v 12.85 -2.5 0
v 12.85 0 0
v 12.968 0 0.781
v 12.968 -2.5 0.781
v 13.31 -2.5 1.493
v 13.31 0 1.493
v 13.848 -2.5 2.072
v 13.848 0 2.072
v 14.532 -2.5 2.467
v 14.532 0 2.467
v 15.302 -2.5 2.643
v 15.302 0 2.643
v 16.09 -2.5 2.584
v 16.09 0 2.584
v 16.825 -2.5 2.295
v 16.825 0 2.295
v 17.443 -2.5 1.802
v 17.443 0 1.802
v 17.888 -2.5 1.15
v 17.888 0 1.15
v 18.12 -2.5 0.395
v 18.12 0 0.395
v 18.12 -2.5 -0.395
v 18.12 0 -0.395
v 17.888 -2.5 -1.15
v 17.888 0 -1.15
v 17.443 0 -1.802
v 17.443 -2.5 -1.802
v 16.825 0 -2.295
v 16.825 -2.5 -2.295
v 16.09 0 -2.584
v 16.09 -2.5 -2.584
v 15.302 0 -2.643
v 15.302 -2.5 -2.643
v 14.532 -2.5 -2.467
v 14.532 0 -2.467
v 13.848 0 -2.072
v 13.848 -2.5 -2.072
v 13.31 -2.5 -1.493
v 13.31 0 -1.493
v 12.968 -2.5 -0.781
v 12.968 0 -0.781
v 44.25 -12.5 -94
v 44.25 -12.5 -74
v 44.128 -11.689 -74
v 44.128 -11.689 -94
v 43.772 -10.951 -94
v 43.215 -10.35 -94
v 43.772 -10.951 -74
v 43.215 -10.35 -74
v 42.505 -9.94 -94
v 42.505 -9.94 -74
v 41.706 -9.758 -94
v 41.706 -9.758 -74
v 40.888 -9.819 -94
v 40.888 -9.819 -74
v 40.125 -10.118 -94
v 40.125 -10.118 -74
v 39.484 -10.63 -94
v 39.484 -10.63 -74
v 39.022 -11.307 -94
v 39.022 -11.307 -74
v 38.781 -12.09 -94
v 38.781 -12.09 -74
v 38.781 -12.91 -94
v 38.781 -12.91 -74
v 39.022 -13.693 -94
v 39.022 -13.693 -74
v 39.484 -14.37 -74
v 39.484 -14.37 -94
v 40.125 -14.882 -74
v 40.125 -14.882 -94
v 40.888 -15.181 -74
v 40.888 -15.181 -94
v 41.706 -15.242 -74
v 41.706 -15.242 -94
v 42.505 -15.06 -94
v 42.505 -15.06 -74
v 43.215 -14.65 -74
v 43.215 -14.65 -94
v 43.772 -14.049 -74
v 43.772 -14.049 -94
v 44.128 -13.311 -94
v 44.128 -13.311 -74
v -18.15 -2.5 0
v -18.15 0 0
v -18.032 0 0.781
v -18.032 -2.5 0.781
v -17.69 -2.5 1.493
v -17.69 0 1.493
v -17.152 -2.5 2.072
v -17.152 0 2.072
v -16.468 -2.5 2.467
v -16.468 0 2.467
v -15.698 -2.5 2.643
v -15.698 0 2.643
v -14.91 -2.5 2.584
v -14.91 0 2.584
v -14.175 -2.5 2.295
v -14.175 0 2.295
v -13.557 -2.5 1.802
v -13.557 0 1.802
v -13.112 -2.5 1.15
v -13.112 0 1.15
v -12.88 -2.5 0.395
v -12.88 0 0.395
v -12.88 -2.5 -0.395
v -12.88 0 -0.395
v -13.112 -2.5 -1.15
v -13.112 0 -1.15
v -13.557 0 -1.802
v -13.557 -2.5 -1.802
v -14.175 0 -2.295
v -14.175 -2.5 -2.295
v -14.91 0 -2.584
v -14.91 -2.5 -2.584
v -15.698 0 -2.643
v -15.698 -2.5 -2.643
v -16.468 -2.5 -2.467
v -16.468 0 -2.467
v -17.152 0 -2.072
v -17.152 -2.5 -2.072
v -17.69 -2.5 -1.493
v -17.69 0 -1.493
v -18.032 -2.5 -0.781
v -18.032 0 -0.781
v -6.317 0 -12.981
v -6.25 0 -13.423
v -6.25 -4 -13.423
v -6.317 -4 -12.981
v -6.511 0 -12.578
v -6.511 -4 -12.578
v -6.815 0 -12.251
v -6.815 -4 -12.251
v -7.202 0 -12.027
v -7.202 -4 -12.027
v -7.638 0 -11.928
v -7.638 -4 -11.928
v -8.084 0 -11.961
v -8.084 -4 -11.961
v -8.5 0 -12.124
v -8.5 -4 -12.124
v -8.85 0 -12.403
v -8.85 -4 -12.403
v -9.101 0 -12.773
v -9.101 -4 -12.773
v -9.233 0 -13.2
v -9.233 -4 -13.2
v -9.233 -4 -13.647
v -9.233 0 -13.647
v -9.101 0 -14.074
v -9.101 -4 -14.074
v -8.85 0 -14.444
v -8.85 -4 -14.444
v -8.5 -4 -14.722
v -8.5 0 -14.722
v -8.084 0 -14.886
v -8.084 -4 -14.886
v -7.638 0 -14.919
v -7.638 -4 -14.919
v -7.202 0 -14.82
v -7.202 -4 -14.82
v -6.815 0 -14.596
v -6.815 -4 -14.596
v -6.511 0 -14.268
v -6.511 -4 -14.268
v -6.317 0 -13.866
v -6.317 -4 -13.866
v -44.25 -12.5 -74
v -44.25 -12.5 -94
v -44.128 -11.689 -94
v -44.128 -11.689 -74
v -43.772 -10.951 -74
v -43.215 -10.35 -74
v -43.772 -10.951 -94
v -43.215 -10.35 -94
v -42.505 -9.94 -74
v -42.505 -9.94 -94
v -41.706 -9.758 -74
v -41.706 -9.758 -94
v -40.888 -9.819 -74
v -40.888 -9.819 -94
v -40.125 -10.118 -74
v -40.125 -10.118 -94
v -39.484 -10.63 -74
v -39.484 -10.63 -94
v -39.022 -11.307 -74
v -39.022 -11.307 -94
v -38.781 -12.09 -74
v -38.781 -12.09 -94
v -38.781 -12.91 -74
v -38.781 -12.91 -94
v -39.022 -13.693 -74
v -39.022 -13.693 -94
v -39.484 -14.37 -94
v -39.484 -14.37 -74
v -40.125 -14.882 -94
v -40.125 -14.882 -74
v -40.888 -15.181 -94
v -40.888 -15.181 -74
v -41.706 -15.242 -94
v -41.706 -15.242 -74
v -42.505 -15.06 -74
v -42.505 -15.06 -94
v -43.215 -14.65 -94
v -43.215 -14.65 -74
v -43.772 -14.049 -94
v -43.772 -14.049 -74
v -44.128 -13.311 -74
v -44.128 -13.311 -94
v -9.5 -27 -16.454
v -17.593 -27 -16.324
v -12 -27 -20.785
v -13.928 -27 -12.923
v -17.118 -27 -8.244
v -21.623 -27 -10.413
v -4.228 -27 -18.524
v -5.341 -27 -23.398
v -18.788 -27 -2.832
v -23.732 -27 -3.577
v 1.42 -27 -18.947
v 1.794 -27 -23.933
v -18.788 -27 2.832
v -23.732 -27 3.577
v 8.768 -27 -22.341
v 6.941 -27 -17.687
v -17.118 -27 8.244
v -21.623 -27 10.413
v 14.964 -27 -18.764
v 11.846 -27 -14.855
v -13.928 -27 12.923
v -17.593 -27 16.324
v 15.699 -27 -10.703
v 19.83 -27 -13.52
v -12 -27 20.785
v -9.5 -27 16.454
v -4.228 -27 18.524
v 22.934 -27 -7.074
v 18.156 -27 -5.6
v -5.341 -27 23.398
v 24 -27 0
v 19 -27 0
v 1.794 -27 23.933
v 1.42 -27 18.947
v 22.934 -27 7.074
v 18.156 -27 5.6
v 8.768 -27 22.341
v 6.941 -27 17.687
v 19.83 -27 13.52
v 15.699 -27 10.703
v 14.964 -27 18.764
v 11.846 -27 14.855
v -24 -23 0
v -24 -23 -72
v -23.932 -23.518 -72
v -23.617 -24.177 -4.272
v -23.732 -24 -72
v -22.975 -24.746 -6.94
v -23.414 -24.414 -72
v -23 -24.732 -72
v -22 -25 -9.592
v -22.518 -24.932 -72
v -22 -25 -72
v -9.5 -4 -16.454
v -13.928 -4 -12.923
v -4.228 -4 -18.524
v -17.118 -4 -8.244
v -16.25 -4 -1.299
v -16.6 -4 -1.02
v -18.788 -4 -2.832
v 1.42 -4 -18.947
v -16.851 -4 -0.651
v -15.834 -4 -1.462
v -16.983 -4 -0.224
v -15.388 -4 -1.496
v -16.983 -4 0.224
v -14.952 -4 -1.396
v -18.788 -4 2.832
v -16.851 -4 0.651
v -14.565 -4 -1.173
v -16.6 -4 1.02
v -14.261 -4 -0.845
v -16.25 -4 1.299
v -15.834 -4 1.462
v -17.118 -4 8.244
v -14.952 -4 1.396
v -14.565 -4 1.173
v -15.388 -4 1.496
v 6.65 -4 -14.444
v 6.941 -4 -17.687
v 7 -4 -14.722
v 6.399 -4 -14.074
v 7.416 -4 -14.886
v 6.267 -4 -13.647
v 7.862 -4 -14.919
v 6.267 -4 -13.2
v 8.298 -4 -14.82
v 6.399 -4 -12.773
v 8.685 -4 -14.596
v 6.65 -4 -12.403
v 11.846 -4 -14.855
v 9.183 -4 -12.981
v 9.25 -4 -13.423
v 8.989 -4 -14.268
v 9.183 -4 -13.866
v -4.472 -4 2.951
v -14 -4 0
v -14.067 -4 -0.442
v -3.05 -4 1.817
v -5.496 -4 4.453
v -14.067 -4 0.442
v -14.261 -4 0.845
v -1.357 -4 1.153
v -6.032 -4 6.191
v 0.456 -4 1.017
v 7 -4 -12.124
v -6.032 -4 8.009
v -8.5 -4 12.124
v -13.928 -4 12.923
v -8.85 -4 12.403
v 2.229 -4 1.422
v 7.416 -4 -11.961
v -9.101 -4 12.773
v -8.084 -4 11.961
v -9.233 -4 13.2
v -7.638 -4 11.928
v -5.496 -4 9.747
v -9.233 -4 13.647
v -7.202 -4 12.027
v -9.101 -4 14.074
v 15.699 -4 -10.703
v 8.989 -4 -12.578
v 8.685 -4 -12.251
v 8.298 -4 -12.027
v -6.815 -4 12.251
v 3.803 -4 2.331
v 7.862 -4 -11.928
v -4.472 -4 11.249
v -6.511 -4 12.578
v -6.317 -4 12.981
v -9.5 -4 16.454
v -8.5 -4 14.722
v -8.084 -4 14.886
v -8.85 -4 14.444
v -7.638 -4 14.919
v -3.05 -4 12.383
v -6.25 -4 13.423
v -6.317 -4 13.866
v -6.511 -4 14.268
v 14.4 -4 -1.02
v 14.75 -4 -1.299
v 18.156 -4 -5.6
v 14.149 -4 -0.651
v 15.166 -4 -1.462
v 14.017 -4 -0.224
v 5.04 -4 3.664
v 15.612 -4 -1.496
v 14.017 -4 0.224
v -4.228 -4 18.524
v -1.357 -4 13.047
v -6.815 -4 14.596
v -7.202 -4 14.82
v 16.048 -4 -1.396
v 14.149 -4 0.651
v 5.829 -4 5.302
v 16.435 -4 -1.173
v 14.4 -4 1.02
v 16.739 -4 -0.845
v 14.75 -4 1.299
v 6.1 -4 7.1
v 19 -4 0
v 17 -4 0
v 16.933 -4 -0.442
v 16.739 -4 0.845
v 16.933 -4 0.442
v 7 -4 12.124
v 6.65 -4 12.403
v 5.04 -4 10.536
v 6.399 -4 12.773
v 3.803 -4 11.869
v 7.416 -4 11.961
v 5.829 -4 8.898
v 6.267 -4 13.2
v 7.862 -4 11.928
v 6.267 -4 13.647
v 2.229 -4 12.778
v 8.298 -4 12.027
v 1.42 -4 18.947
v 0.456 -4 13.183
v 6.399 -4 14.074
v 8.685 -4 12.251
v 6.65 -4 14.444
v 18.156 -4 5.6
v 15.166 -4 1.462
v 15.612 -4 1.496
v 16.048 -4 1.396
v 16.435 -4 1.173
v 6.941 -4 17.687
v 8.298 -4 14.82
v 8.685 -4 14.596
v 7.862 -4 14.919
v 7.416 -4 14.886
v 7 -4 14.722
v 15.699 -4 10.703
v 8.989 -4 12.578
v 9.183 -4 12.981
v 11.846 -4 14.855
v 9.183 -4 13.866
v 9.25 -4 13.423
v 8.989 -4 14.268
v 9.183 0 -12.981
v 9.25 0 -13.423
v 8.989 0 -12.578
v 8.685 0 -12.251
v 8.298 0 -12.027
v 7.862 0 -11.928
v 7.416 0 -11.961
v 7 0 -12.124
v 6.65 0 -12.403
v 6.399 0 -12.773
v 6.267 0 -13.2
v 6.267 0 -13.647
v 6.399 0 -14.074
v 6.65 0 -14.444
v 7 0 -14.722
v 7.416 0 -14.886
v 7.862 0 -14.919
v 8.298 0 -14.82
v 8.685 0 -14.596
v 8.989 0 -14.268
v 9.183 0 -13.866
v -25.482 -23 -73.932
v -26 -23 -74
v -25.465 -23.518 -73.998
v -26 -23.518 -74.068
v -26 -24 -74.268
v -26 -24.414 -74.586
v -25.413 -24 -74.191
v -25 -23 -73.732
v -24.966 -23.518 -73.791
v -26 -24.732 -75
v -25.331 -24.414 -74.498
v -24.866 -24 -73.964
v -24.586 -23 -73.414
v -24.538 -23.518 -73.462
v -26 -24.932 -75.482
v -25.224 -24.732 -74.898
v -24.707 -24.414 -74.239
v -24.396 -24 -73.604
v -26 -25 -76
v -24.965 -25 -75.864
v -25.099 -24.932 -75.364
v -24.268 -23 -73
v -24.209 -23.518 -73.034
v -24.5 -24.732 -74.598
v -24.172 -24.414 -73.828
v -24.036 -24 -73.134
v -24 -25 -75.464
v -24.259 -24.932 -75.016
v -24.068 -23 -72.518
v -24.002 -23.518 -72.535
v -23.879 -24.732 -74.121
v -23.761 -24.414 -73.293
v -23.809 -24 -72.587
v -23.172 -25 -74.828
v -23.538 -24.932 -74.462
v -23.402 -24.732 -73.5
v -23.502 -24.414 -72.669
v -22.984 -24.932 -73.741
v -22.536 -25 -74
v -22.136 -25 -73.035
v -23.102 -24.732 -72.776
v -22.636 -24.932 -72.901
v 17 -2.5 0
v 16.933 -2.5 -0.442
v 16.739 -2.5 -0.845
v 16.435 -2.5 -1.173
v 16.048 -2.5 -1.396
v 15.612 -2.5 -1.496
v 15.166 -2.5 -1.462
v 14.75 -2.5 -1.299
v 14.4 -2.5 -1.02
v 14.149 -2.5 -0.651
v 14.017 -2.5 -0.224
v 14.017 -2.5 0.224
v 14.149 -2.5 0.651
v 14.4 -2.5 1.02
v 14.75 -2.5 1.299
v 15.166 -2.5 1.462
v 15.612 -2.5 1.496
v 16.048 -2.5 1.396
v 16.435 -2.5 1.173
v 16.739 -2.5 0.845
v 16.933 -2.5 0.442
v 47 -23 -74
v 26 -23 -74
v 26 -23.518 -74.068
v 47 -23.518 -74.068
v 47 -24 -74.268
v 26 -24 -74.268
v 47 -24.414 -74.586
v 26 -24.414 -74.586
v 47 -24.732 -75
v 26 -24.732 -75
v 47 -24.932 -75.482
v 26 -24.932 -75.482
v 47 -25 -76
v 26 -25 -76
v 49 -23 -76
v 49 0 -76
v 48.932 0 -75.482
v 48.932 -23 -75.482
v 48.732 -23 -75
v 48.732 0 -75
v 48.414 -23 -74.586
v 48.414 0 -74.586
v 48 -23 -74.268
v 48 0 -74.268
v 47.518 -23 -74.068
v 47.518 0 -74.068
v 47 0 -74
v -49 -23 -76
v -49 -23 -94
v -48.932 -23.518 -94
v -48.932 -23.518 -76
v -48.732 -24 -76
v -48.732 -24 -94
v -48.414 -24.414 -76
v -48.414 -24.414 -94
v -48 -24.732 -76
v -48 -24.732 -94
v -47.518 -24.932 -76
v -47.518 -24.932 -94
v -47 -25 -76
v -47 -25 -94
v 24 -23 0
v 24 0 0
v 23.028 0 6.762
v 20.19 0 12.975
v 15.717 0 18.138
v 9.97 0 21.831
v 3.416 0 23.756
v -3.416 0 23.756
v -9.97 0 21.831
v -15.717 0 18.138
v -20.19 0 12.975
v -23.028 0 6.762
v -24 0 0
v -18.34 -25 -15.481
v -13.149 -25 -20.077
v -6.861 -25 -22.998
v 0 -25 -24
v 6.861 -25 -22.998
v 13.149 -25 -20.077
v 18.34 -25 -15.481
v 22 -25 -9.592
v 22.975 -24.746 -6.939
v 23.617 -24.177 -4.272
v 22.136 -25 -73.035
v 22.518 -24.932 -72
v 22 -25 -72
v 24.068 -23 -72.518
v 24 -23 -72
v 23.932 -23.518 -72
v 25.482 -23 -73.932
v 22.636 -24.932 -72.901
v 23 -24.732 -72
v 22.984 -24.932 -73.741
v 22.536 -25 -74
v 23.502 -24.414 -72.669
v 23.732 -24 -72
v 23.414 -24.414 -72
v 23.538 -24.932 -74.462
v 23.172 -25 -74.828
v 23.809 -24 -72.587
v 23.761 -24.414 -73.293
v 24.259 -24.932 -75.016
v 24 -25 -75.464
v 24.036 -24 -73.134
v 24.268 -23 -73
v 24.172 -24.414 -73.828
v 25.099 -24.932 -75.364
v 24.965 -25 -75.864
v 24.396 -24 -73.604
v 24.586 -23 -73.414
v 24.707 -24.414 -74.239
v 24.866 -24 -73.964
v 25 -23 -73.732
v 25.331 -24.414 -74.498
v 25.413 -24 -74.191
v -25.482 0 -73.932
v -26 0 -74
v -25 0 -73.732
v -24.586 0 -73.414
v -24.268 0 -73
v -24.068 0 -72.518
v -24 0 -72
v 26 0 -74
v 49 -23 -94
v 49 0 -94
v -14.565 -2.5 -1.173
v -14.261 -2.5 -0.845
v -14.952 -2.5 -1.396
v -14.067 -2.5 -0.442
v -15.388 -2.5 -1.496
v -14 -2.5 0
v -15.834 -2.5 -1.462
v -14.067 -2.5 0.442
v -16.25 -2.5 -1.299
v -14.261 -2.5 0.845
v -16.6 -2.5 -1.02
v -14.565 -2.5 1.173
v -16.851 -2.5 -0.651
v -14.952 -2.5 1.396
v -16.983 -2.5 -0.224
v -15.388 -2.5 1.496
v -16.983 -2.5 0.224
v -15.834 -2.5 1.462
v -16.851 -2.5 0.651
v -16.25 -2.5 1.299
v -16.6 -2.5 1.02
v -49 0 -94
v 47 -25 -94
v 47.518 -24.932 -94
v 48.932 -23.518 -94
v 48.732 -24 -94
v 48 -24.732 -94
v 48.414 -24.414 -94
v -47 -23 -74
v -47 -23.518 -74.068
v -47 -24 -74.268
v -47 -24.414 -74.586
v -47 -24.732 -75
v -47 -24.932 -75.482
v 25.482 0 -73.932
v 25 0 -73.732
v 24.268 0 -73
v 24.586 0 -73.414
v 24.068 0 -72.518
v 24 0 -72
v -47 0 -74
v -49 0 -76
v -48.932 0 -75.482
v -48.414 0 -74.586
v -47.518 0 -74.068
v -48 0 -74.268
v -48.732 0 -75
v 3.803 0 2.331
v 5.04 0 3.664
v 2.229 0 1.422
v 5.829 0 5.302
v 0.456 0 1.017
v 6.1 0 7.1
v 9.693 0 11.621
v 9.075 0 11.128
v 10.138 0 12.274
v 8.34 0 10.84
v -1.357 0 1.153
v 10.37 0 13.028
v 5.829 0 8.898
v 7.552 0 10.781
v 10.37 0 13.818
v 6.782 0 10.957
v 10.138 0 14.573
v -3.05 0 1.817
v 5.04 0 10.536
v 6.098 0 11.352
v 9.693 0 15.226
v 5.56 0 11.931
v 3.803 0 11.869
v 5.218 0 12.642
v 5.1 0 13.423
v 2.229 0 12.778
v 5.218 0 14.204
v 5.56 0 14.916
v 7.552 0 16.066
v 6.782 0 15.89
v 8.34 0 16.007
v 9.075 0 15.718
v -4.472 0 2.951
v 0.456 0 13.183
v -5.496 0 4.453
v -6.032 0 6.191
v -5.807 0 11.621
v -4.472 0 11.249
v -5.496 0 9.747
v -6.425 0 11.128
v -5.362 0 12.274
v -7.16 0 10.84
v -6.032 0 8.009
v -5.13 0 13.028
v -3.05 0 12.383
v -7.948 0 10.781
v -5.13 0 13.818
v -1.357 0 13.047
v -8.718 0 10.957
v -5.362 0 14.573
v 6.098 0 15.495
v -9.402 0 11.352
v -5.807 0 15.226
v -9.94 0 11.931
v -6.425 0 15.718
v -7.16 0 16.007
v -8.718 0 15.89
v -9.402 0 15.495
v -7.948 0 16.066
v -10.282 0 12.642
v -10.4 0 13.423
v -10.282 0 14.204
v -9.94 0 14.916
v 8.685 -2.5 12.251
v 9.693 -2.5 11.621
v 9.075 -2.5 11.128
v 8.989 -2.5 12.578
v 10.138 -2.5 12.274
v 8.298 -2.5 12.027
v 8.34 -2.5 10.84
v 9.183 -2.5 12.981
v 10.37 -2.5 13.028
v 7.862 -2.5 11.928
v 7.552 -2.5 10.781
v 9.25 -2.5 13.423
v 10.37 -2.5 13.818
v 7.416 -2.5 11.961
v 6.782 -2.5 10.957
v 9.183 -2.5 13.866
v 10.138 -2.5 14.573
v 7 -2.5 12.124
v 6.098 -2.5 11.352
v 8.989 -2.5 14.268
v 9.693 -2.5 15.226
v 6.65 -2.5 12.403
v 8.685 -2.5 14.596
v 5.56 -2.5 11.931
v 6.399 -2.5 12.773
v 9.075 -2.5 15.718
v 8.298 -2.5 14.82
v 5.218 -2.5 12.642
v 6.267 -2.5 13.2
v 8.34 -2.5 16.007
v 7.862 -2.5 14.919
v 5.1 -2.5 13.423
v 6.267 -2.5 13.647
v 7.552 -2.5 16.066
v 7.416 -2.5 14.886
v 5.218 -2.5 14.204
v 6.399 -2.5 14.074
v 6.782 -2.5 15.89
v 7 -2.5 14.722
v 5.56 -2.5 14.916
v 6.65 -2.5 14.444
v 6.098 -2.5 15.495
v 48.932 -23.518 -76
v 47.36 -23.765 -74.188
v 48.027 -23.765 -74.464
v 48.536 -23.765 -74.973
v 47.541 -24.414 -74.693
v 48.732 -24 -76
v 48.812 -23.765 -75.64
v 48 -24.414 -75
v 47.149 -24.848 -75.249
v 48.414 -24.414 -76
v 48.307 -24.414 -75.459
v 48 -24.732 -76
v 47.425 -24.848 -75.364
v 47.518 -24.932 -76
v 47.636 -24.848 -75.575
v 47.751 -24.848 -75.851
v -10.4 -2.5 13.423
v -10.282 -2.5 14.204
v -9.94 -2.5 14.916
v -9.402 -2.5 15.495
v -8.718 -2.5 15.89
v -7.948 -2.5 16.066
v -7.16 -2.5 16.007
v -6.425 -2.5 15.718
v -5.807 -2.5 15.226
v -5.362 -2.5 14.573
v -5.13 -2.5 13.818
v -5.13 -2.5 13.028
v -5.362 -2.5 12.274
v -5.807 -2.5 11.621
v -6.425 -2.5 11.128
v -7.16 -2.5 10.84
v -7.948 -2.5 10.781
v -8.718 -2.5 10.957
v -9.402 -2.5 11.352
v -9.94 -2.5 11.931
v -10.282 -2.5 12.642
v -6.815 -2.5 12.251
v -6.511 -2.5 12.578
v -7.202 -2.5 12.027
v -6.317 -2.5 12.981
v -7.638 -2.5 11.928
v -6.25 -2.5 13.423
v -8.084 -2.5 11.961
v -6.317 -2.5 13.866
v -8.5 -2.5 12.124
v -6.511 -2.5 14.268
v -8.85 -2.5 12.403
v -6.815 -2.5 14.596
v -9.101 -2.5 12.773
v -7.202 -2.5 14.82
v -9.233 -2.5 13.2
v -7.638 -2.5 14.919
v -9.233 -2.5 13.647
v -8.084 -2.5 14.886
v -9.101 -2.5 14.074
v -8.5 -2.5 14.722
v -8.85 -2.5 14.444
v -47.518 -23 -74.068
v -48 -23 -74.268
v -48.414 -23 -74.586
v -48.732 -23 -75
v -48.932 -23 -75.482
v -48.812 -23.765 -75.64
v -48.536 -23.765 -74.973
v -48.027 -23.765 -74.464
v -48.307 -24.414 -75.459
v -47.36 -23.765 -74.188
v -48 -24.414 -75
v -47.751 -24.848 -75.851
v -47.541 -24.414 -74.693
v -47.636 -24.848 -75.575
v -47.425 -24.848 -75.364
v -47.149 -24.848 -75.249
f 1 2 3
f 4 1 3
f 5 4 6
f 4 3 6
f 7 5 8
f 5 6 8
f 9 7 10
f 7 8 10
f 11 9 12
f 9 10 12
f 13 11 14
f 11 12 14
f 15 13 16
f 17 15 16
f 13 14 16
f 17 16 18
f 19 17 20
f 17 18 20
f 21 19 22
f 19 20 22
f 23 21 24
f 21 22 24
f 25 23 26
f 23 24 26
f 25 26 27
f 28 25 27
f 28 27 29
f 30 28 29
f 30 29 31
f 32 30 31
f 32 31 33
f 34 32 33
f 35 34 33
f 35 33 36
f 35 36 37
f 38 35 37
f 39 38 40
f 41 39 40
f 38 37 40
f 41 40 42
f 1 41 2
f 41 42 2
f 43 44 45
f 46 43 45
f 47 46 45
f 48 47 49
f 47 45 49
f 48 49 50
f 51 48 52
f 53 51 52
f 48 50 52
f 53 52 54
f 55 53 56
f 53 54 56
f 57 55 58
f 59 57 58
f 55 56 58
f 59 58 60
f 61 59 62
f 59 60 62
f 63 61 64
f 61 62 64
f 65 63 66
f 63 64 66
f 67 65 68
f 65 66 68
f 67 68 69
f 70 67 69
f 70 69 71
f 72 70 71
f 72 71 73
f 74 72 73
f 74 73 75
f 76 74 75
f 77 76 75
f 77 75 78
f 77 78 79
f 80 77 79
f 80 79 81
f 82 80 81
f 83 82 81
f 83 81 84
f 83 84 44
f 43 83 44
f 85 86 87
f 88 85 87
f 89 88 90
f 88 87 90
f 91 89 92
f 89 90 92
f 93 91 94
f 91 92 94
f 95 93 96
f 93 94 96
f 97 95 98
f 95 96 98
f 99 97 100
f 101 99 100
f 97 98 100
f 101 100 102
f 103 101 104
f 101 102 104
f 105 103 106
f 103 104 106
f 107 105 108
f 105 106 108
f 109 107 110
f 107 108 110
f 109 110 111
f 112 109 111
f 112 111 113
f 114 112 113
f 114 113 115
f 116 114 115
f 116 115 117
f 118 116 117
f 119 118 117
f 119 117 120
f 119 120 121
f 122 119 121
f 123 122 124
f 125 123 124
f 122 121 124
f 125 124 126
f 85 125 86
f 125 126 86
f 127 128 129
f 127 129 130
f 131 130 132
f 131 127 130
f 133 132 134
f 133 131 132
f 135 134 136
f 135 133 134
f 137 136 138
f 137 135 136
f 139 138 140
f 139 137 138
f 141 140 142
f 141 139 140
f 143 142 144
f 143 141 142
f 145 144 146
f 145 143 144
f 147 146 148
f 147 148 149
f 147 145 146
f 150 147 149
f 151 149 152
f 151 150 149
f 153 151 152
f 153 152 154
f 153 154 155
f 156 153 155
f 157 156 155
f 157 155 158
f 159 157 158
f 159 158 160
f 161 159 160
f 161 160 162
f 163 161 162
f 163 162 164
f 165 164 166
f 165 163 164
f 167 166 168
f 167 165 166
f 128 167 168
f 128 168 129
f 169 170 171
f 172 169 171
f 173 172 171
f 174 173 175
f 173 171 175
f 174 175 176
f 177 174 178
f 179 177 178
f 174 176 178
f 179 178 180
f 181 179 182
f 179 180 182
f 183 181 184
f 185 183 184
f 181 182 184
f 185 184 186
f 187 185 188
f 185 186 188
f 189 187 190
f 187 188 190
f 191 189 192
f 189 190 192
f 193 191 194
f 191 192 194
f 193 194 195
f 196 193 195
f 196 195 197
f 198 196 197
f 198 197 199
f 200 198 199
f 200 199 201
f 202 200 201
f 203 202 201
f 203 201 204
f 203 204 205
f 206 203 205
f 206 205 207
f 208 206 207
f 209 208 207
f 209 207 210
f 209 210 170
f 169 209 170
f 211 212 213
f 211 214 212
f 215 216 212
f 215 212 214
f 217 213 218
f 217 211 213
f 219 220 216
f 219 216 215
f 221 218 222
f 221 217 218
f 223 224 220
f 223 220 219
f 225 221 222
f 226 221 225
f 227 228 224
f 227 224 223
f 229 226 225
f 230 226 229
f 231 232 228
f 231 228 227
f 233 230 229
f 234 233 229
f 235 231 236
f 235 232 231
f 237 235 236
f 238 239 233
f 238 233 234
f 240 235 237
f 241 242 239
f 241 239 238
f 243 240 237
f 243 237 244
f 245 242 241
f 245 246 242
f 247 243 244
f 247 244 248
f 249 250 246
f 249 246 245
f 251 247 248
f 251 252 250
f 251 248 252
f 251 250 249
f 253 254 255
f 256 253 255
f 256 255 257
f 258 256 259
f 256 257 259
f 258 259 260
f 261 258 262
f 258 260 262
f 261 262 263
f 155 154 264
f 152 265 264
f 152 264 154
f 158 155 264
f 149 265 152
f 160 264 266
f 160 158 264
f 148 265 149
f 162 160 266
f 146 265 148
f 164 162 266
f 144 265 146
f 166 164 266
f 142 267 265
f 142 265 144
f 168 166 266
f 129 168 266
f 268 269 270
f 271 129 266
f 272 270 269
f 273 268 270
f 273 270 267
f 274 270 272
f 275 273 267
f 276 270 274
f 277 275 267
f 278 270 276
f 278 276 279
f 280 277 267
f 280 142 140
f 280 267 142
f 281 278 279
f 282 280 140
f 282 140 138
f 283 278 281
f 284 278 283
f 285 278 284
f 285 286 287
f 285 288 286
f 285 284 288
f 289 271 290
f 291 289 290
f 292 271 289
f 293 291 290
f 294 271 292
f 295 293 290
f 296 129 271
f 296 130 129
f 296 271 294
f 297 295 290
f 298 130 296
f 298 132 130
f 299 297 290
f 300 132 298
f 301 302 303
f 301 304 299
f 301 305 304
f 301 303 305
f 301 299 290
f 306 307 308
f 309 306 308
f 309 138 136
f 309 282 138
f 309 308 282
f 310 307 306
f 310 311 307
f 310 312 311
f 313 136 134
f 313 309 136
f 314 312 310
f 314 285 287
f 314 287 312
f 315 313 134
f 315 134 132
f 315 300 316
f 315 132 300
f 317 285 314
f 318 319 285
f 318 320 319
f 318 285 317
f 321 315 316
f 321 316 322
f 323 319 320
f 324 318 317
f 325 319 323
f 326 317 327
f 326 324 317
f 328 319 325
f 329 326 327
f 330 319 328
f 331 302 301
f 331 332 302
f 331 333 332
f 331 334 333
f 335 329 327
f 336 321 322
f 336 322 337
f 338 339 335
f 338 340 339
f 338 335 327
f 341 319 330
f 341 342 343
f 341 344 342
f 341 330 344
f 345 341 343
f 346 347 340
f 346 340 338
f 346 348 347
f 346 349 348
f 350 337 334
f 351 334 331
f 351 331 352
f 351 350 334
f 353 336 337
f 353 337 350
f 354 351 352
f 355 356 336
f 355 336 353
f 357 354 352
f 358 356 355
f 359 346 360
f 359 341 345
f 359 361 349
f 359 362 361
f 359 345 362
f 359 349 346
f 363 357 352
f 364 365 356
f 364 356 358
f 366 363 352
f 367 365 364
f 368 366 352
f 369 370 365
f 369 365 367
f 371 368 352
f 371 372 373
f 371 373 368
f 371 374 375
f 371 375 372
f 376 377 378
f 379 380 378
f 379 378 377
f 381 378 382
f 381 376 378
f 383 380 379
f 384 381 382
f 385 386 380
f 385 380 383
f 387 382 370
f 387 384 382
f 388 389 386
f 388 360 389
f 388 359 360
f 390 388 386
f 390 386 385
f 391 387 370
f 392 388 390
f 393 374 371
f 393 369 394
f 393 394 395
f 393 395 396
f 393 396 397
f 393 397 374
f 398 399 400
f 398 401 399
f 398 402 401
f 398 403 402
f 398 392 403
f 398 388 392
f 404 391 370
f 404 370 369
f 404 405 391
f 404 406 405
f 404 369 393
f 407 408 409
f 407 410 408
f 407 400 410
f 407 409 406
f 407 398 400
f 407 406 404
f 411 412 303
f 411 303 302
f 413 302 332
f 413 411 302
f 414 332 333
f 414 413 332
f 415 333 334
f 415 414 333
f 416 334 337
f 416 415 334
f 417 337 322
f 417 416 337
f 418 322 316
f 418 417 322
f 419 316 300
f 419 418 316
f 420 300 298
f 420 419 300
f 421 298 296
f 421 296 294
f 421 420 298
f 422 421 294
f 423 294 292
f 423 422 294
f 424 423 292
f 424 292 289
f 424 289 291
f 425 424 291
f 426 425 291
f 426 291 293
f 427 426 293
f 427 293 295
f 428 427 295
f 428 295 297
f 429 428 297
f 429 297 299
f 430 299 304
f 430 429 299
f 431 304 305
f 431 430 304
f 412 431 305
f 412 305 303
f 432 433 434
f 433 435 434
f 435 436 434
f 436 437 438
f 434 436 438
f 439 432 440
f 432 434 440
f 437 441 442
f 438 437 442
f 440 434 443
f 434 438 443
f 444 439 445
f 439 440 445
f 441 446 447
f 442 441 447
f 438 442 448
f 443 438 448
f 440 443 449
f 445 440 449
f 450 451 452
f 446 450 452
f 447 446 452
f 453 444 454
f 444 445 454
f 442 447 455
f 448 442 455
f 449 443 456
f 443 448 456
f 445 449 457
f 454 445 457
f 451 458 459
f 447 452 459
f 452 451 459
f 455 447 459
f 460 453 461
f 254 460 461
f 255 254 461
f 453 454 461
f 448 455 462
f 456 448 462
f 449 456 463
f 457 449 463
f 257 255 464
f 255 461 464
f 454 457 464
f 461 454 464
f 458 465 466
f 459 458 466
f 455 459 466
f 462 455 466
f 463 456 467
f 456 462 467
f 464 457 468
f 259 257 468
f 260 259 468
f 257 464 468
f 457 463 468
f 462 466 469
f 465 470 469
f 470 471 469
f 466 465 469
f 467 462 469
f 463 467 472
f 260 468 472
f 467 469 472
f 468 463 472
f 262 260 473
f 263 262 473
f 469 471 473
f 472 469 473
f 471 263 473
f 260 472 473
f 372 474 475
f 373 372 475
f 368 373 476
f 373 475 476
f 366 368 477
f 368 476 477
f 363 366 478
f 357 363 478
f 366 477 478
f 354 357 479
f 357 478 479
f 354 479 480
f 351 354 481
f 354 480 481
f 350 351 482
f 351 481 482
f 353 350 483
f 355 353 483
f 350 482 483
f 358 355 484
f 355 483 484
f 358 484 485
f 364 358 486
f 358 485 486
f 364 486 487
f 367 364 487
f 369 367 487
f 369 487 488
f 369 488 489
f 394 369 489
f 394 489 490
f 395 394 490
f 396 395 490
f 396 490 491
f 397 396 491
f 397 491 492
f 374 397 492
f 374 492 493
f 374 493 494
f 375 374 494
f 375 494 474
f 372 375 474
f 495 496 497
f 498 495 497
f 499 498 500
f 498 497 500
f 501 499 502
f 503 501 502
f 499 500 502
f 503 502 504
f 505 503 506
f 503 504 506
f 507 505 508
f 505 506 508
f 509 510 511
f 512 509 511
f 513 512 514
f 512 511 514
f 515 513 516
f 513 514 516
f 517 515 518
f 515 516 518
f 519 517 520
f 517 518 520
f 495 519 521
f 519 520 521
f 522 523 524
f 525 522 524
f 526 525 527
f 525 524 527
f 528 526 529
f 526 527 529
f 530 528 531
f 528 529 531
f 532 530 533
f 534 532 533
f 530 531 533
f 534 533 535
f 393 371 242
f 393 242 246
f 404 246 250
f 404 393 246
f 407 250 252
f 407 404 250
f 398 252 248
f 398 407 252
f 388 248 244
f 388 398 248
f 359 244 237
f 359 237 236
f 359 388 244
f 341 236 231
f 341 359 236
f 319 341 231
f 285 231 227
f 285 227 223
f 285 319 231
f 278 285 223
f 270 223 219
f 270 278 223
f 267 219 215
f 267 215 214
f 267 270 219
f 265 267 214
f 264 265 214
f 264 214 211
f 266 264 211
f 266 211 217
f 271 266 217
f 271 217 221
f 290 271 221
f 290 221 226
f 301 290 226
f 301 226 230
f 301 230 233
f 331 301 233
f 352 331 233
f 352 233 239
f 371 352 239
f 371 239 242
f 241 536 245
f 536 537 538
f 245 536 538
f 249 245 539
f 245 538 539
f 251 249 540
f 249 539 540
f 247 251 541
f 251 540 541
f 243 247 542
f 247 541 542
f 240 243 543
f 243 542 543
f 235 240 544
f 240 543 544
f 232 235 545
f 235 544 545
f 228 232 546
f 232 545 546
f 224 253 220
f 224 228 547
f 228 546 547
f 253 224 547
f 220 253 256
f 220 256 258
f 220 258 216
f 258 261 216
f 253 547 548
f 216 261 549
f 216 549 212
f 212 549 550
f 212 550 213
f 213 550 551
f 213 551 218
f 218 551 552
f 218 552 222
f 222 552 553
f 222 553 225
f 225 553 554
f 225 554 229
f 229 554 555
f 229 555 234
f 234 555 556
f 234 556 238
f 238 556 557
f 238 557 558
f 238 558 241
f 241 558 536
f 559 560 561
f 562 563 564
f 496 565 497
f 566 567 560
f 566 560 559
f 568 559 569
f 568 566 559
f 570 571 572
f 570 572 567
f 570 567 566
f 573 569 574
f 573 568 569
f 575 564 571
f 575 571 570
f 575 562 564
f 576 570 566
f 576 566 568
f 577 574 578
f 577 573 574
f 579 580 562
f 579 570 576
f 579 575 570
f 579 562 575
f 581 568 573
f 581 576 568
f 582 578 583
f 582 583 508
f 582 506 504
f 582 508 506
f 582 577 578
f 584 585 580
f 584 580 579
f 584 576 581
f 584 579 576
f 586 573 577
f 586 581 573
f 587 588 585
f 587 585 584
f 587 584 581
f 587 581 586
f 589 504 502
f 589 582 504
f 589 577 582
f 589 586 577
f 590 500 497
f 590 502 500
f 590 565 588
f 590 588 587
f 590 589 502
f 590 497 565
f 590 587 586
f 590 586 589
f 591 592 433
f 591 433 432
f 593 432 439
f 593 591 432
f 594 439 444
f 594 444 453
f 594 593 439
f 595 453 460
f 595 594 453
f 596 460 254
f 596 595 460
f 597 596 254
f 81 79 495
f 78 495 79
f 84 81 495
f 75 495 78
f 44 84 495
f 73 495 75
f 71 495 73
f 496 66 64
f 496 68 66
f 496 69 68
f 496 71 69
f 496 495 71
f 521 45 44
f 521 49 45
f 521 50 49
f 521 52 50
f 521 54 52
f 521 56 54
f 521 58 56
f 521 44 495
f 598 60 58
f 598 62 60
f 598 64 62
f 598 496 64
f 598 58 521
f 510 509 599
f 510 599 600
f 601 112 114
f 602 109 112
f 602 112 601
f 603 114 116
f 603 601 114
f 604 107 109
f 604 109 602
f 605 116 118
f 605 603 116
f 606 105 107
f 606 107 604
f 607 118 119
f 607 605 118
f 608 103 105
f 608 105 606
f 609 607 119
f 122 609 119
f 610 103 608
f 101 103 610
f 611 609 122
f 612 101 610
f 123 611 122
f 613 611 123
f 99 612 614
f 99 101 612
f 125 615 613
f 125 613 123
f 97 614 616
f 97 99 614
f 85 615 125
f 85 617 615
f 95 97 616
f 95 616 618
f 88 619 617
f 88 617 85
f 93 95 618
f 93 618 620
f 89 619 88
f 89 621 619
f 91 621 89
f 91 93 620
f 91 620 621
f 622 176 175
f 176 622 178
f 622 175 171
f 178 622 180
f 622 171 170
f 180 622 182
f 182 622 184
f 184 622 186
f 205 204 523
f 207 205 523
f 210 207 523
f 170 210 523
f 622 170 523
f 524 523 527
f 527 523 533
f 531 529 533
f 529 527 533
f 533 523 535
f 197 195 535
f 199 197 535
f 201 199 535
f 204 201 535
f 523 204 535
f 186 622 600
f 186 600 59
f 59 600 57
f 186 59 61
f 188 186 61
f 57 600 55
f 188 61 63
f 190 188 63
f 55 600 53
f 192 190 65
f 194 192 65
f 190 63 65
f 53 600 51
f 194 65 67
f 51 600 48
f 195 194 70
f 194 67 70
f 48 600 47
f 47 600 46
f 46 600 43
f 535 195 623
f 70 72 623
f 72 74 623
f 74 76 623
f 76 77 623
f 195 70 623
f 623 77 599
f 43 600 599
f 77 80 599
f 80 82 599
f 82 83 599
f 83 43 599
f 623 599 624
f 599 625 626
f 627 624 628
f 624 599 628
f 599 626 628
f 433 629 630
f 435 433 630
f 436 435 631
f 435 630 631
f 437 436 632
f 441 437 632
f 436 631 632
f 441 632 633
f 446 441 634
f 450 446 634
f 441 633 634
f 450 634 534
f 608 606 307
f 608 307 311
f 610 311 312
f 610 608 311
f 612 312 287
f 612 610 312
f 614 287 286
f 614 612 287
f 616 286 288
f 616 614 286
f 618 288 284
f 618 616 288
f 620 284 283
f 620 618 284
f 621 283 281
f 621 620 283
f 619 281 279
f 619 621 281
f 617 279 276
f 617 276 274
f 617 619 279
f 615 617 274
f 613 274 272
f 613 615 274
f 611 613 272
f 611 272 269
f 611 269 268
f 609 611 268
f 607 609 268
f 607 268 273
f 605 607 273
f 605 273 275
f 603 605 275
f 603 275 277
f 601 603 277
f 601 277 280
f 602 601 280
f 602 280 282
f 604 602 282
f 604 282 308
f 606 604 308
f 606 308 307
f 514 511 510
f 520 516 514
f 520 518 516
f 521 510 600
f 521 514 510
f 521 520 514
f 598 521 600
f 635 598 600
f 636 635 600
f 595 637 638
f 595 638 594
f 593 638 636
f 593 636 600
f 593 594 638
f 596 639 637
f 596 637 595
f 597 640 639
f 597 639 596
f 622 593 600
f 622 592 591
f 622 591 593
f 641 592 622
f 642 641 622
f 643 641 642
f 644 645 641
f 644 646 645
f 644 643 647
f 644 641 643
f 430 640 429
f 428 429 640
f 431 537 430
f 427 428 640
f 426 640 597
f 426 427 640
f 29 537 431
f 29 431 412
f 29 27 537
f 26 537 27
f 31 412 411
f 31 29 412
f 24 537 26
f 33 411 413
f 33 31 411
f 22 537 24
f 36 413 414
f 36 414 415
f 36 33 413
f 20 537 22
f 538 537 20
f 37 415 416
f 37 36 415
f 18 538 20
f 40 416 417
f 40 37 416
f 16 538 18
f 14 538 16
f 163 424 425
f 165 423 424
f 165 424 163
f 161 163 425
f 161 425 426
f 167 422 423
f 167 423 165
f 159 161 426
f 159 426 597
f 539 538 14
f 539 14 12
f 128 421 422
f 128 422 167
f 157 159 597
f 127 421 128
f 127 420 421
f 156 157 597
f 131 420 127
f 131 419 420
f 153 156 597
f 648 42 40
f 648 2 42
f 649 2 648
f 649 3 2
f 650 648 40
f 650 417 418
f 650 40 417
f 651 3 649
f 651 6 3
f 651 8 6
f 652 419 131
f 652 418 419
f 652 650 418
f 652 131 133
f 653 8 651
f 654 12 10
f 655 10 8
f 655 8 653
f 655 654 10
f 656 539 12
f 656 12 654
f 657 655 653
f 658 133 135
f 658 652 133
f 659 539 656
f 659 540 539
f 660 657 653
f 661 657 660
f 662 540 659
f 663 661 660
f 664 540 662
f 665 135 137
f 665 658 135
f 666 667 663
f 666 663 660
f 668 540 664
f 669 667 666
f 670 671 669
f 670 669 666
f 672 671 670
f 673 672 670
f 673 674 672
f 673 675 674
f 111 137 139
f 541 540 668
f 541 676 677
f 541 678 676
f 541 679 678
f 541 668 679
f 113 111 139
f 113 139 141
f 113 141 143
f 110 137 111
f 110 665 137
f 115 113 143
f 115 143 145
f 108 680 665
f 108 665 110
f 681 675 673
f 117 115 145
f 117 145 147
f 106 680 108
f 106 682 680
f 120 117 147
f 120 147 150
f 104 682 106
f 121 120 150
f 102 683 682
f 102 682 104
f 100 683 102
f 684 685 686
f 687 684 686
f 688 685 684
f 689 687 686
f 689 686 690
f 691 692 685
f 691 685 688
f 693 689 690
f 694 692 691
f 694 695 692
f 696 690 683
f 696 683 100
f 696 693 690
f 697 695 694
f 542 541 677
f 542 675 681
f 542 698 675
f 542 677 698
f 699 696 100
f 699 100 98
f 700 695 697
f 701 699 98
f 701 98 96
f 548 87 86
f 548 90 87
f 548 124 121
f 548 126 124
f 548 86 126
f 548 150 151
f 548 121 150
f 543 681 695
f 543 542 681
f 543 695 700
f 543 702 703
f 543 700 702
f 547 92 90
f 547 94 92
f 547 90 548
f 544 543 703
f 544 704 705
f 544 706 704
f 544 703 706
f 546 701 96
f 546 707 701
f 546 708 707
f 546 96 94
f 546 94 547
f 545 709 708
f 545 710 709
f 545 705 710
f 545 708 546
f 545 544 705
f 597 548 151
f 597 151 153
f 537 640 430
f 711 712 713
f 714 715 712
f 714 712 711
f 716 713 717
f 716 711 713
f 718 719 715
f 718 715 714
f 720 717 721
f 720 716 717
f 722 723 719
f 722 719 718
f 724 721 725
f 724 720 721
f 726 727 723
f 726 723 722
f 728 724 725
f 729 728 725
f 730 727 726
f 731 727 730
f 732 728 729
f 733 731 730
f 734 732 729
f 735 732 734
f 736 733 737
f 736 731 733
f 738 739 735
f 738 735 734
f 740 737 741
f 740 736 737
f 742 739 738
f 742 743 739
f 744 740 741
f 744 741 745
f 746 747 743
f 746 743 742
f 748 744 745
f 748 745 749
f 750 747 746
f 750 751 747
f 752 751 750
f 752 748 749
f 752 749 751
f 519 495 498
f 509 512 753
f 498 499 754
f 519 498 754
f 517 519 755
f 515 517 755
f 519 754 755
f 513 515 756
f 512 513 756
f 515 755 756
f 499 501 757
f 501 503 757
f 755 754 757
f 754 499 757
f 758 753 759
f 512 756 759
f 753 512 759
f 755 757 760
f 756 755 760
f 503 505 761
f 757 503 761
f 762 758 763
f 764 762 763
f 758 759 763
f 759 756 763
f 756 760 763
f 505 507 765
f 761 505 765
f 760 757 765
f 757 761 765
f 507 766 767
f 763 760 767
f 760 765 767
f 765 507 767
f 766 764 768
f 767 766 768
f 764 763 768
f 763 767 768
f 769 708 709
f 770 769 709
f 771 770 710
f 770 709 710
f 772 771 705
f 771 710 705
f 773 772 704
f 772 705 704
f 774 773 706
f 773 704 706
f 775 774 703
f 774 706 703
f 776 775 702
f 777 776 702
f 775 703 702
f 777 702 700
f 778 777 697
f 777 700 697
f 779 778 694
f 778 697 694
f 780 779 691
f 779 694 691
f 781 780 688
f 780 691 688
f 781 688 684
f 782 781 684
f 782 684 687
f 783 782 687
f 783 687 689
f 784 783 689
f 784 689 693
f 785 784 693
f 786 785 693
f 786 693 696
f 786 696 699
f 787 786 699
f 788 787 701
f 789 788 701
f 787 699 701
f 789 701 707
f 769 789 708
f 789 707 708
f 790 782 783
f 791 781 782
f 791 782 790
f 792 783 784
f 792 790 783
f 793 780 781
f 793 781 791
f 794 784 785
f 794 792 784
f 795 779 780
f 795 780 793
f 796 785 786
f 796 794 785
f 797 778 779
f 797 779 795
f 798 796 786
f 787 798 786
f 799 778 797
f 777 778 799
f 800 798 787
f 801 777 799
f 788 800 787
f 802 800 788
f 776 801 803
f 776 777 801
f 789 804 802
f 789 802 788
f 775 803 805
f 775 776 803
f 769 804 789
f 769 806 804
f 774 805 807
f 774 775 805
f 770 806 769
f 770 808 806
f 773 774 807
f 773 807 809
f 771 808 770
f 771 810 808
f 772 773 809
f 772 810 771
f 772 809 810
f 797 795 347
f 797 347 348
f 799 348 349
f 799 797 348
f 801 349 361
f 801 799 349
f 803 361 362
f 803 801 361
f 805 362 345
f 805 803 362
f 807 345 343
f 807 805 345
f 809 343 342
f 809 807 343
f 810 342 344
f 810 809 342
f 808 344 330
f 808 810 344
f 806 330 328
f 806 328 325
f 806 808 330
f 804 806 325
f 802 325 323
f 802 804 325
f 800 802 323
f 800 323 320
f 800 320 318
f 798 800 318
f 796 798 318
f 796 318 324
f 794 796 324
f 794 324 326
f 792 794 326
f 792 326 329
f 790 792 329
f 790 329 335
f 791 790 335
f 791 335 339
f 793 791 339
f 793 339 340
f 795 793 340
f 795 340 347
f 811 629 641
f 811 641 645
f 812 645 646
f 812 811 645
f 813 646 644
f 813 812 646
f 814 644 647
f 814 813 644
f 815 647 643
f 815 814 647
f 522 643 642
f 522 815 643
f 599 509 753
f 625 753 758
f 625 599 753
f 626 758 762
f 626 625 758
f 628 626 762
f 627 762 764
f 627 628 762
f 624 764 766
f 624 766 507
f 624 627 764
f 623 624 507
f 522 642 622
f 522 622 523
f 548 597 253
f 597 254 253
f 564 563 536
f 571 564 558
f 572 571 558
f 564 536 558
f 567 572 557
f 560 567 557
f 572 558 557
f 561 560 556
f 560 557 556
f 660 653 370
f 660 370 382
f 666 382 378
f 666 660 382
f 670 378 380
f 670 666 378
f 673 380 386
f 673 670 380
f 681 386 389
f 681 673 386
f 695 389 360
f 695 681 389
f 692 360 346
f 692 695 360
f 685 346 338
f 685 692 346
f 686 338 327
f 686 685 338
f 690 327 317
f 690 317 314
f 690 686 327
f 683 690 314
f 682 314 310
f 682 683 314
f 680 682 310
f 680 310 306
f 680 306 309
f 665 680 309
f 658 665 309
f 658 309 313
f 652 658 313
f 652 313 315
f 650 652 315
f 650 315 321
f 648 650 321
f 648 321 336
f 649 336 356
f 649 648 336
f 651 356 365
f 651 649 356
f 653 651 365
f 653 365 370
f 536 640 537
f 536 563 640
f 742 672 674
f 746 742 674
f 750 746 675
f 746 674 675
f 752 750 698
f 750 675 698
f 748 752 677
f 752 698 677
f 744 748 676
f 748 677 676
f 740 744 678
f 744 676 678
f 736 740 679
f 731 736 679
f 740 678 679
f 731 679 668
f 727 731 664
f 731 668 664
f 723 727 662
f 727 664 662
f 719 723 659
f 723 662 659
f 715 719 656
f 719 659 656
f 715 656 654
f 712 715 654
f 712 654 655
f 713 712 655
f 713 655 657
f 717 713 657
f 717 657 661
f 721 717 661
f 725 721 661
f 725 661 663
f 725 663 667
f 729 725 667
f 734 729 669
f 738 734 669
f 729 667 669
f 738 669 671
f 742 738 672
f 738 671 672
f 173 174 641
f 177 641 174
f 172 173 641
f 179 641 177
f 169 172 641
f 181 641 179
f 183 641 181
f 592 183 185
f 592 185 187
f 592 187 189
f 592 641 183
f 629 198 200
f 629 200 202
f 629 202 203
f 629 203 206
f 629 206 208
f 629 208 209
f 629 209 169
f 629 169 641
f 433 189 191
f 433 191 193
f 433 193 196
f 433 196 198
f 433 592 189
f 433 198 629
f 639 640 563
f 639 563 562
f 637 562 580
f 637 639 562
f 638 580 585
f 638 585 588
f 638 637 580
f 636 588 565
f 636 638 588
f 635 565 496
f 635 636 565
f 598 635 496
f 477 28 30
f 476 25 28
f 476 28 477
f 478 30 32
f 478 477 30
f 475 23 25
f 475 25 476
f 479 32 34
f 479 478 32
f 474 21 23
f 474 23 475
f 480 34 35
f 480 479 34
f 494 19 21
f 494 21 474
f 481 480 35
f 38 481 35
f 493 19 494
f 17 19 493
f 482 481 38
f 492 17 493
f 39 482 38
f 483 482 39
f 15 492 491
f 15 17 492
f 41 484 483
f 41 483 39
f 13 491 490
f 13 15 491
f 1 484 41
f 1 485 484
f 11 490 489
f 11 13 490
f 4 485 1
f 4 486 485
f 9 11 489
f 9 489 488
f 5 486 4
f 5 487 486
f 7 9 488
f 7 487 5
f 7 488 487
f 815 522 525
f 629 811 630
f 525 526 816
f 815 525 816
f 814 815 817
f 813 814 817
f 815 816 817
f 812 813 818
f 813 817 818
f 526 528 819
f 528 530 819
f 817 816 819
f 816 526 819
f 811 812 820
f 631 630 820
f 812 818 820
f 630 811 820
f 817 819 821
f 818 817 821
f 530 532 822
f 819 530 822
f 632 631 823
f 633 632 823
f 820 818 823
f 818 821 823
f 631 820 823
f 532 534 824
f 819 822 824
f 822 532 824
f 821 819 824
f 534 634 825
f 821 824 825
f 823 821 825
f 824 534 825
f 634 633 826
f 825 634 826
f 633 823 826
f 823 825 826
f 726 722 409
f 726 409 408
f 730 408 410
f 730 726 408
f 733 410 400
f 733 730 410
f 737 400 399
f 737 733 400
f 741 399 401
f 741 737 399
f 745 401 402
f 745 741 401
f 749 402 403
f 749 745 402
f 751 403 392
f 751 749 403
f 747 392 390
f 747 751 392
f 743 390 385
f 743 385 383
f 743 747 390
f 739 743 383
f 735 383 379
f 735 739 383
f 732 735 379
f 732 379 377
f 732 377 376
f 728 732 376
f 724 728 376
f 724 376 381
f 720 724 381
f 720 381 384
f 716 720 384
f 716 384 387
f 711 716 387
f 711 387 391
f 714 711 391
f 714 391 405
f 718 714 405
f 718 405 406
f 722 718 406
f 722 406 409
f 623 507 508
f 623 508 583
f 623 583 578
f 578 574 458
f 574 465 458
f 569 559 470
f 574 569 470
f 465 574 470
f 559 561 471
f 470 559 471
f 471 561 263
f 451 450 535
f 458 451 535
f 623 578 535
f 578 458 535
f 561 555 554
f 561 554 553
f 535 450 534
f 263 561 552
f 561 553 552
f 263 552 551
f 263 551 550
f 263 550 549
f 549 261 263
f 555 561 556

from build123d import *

# Parameters (mm, degrees)
F0_R          = 19
F0_R_2        = 1.5
F0_R_3        = 6.1
F1_DEPTH      = 4
F2_R          = 24
F2_R_2        = 19
F3_DEPTH      = 27
F5_DEPTH      = 25
F6_R          = 2.65
F7_DEPTH      = 2.5
F8_W          = 24
F8_H          = 54
F9_DEPTH      = 25
F10_W         = 25
F10_H         = 20
F11_DEPTH     = 25
F13_W         = 25
F13_H         = 20
F14_DEPTH     = 25
F15_R         = 2
F17_DEPTH     = 25
F18_DEPTH     = 25
F19_T1_DEPTH  = 25
F19_T3_DEPTH  = 21
F19_T5_DEPTH  = 23
F19_T7_DEPTH  = 21
F19_T12_DEPTH = 87
F19_S13_R     = 24
F19_T14_DEPTH = 45
F19_T18_DEPTH = 87
F19_S19_R     = 24
F19_T20_DEPTH = 45
F19_T22_ANGLE = 90
F19_T24_ANGLE = 90
F19_T26_ANGLE = 90
F19_T28_ANGLE = 90


# Not quite as in the source:
# - a fillet or chamfer that OpenCascade refuses, or shapes differently, is made with other operations: its cross-section is extruded or revolved along the edge and cut away or added


with BuildPart() as f1:
    # F0 (on Front) → F1 (new body)
    with BuildSketch(Plane.XZ):
        Circle(F0_R)
        with Locations((-7.75, -13.4233937587)):
            Circle(F0_R_2, mode=Mode.SUBTRACT)
        with Locations((7.75, -13.4233937587)):
            Circle(F0_R_2, mode=Mode.SUBTRACT)
        with Locations((-15.5, 0)):
            Circle(F0_R_2, mode=Mode.SUBTRACT)
        with Locations((-7.75, 13.4233937587)):
            Circle(F0_R_2, mode=Mode.SUBTRACT)
        with Locations((0, 7.1)):
            Circle(F0_R_3, mode=Mode.SUBTRACT)
        with BuildLine():
            ThreePointArc((14, 0), (15.5, 1.5), (17, 0))
            ThreePointArc((17, 0), (15.5, -1.5), (14, 0))
        make_face(mode=Mode.SUBTRACT)
        with Locations((7.75, 13.4233937587)):
            Circle(F0_R_2, mode=Mode.SUBTRACT)
    extrude(amount=F1_DEPTH)

    # F2 (on Front) → F3 (join)
    with BuildSketch(Plane.XZ):
        Circle(F2_R)
        Circle(F2_R_2, mode=Mode.SUBTRACT)
    extrude(amount=F3_DEPTH)

    # F4 (on face) → F5 (join)
    with BuildSketch(Plane(origin=(0, 0, 0), x_dir=(-1, 0, 0), z_dir=(0, 1, 0))):
        with BuildLine():
            Line((24, -40), (24, 0))
            ThreePointArc((24, 0), (0, -24), (-24, 0))
            Line((-24, 0), (-24, -40))
            Line((-24, -40), (0, -40))
            Line((0, -40), (24, -40))
        make_face()
    extrude(amount=-F5_DEPTH)

    # F6 (on face) → F7 (cut)
    with BuildSketch(Plane(origin=(0, 0, 0), x_dir=(-1, 0, 0), z_dir=(0, 1, 0))):
        with Locations((-7.75, 13.4233937587)):
            Circle(F6_R)
        with Locations((7.75, 13.4233937587)):
            Circle(F6_R)
        with Locations((-15.5, 0)):
            Circle(F6_R)
        with Locations((15.5, 0)):
            Circle(F6_R)
    extrude(amount=-F7_DEPTH, mode=Mode.SUBTRACT)

    # F8 (on face) → F9 (join, through all)
    with BuildSketch(Plane.XZ.offset(25)):
        with Locations((12, -67)):
            Rectangle(F8_W, F8_H)
        with Locations((-12, -67)):
            Rectangle(F8_W, F8_H)
    extrude(amount=-F9_DEPTH)

    # F10 (on face) → F11 (join)
    with BuildSketch(Plane.YZ.offset(24)):
        with Locations((-12.5, -84)):
            Rectangle(F10_W, F10_H)
    extrude(amount=F11_DEPTH)

    # F13 (on face) → F14 (join)
    with BuildSketch(Plane(origin=(-24, 0, 0), x_dir=(0, -1, 0), z_dir=(-1, 0, 0))):
        with Locations((12.5, -84)):
            Rectangle(F13_W, F13_H)
    extrude(amount=F14_DEPTH)

    # F15
    f15_edges = [f1.edges().sort_by_distance(p)[0] for p in [
        (49, -12.5, -74),
        (-49, -12.5, -74),
    ]]
    fillet(f15_edges, radius=F15_R)

    # F16 (on face) → F17 (cut)
    with BuildSketch(Plane(origin=(0, 0, -94), x_dir=(1, 0, 0), z_dir=(0, 0, -1))):
        with BuildLine():
            ThreePointArc((-38.75, 12.5), (-41.5, 15.25), (-44.25, 12.5))
            Line((-44.25, 12.5), (-38.75, 12.5))
        make_face()
        with BuildLine():
            Line((-38.75, 12.5), (-44.25, 12.5))
            ThreePointArc((-44.25, 12.5), (-41.5, 9.75), (-38.75, 12.5))
        make_face()
    extrude(amount=-F17_DEPTH, mode=Mode.SUBTRACT)

    # F12 (on face) → F18 (cut)
    with BuildSketch(Plane.XY.offset(-74)):
        with BuildLine():
            ThreePointArc((38.75, -12.5), (41.5, -15.25), (44.25, -12.5))
            Line((44.25, -12.5), (38.75, -12.5))
        make_face()
        with BuildLine():
            Line((38.75, -12.5), (44.25, -12.5))
            ThreePointArc((44.25, -12.5), (41.5, -9.75), (38.75, -12.5))
        make_face()
    extrude(amount=-F18_DEPTH, mode=Mode.SUBTRACT)

    # F19: fillet of radius 2 on 10 edges, made by hand

    # F19_s2 → F19_t1 (join)
    with BuildSketch(Plane.XZ):
        with BuildLine():
            ThreePointArc((24, -72), (24.5857864376, -73.4142135624), (26, -74))
            Line((26, -74), (24, -74))
            Line((24, -74), (24, -72))
        make_face()
        with BuildLine():
            ThreePointArc((-26, -74), (-24.5857864376, -73.4142135624), (-24, -72))
            Line((-24, -72), (-24, -74))
            Line((-24, -74), (-26, -74))
        make_face()
    extrude(amount=F19_T1_DEPTH)

    # F19_s4 → F19_t3 (cut)
    with BuildSketch(Plane.YZ.offset(-47)):
        with BuildLine():
            ThreePointArc((-23, -74), (-24.4142135624, -74.5857864376), (-25, -76))
            Line((-25, -76), (-25, -74))
            Line((-25, -74), (-23, -74))
        make_face()
    extrude(amount=F19_T3_DEPTH, mode=Mode.SUBTRACT)

    # F19_s6 → F19_t5 (cut)
    with BuildSketch(Plane.XY.offset(-99)):
        with BuildLine():
            ThreePointArc((-49, -23), (-48.4142135624, -24.4142135624), (-47, -25))
            Line((-47, -25), (-49, -25))
            Line((-49, -25), (-49, -23))
        make_face()
        with BuildLine():
            ThreePointArc((49, -23), (48.4142135624, -24.4142135624), (47, -25))
            Line((47, -25), (49, -25))
            Line((49, -25), (49, -23))
        make_face()
    extrude(amount=F19_T5_DEPTH, mode=Mode.SUBTRACT)

    # F19_s8 → F19_t7 (cut)
    with BuildSketch(Plane.YZ.offset(26)):
        with BuildLine():
            ThreePointArc((-23, -74), (-24.4142135624, -74.5857864376), (-25, -76))
            Line((-25, -76), (-25, -74))
            Line((-25, -74), (-23, -74))
        make_face()
    extrude(amount=F19_T7_DEPTH, mode=Mode.SUBTRACT)


with BuildPart() as f19_tool10:
    # F19_s11 → F19_t12 (new body)
    with BuildSketch(Plane.XY.offset(15)):
        with BuildLine():
            ThreePointArc((24, -23), (23.4142135624, -24.4142135624), (22, -25))
            Line((22, -25), (24, -25))
            Line((24, -25), (24, -23))
        make_face()
    extrude(amount=-F19_T12_DEPTH)

    # F19_s13 → F19_t14 (cut, symmetric)
    with BuildSketch(Plane.XZ.offset(24)):
        Circle(F19_S13_R)
    extrude(amount=F19_T14_DEPTH, both=True, mode=Mode.SUBTRACT)


with BuildPart() as f1_1:
    add(f1.part)

    # F19_t9: cut F19_tool10
    add(f19_tool10.part, mode=Mode.SUBTRACT)


with BuildPart() as f19_tool16:
    # F19_s17 → F19_t18 (new body)
    with BuildSketch(Plane.XY.offset(-72)):
        with BuildLine():
            ThreePointArc((-24, -23), (-23.4142135624, -24.4142135624), (-22, -25))
            Line((-22, -25), (-24, -25))
            Line((-24, -25), (-24, -23))
        make_face()
    extrude(amount=F19_T18_DEPTH)

    # F19_s19 → F19_t20 (cut, symmetric)
    with BuildSketch(Plane.XZ.offset(24)):
        Circle(F19_S19_R)
    extrude(amount=F19_T20_DEPTH, both=True, mode=Mode.SUBTRACT)


with BuildPart() as f1_2:
    add(f1_1.part)

    # F19_t15: cut F19_tool16
    add(f19_tool16.part, mode=Mode.SUBTRACT)

    # F19_s21 → F19_t22 (revolve, cut)
    with BuildSketch(Plane.XY.offset(-76)):
        with BuildLine():
            ThreePointArc((-49, -23), (-48.4142135624, -24.4142135624), (-47, -25))
            Line((-47, -25), (-49, -25))
            Line((-49, -25), (-49, -23))
        make_face()
    revolve(axis=Axis((-47, -25, -76), (0, 1, 0)), revolution_arc=F19_T22_ANGLE, mode=Mode.SUBTRACT)

    # F19_s23 → F19_t24 (revolve, cut)
    with BuildSketch(Plane.YZ.offset(47)):
        with BuildLine():
            ThreePointArc((-23, -74), (-24.4142135624, -74.5857864376), (-25, -76))
            Line((-25, -76), (-25, -74))
            Line((-25, -74), (-23, -74))
        make_face()
    revolve(axis=Axis((47, -25, -76), (0, 1, 0)), revolution_arc=F19_T24_ANGLE, mode=Mode.SUBTRACT)

    # F19_s25 → F19_t26 (revolve, cut)
    with BuildSketch(Plane.XY.offset(-72)):
        with BuildLine():
            ThreePointArc((22, -25), (23.4142135624, -24.4142135624), (24, -23))
            Line((24, -23), (24, -25))
            Line((24, -25), (22, -25))
        make_face()
    revolve(axis=Axis((26, -25, -72), (0, -1, 0)), revolution_arc=F19_T26_ANGLE, mode=Mode.SUBTRACT)

    # F19_s27 → F19_t28 (revolve, cut)
    with BuildSketch(Plane.YZ.offset(-26)):
        with BuildLine():
            ThreePointArc((-23, -74), (-24.4142135624, -74.5857864376), (-25, -76))
            Line((-25, -76), (-25, -74))
            Line((-25, -74), (-23, -74))
        make_face()
    revolve(axis=Axis((-26, -25, -72), (0, -1, 0)), revolution_arc=F19_T28_ANGLE, mode=Mode.SUBTRACT)


solid = f1_2.part
